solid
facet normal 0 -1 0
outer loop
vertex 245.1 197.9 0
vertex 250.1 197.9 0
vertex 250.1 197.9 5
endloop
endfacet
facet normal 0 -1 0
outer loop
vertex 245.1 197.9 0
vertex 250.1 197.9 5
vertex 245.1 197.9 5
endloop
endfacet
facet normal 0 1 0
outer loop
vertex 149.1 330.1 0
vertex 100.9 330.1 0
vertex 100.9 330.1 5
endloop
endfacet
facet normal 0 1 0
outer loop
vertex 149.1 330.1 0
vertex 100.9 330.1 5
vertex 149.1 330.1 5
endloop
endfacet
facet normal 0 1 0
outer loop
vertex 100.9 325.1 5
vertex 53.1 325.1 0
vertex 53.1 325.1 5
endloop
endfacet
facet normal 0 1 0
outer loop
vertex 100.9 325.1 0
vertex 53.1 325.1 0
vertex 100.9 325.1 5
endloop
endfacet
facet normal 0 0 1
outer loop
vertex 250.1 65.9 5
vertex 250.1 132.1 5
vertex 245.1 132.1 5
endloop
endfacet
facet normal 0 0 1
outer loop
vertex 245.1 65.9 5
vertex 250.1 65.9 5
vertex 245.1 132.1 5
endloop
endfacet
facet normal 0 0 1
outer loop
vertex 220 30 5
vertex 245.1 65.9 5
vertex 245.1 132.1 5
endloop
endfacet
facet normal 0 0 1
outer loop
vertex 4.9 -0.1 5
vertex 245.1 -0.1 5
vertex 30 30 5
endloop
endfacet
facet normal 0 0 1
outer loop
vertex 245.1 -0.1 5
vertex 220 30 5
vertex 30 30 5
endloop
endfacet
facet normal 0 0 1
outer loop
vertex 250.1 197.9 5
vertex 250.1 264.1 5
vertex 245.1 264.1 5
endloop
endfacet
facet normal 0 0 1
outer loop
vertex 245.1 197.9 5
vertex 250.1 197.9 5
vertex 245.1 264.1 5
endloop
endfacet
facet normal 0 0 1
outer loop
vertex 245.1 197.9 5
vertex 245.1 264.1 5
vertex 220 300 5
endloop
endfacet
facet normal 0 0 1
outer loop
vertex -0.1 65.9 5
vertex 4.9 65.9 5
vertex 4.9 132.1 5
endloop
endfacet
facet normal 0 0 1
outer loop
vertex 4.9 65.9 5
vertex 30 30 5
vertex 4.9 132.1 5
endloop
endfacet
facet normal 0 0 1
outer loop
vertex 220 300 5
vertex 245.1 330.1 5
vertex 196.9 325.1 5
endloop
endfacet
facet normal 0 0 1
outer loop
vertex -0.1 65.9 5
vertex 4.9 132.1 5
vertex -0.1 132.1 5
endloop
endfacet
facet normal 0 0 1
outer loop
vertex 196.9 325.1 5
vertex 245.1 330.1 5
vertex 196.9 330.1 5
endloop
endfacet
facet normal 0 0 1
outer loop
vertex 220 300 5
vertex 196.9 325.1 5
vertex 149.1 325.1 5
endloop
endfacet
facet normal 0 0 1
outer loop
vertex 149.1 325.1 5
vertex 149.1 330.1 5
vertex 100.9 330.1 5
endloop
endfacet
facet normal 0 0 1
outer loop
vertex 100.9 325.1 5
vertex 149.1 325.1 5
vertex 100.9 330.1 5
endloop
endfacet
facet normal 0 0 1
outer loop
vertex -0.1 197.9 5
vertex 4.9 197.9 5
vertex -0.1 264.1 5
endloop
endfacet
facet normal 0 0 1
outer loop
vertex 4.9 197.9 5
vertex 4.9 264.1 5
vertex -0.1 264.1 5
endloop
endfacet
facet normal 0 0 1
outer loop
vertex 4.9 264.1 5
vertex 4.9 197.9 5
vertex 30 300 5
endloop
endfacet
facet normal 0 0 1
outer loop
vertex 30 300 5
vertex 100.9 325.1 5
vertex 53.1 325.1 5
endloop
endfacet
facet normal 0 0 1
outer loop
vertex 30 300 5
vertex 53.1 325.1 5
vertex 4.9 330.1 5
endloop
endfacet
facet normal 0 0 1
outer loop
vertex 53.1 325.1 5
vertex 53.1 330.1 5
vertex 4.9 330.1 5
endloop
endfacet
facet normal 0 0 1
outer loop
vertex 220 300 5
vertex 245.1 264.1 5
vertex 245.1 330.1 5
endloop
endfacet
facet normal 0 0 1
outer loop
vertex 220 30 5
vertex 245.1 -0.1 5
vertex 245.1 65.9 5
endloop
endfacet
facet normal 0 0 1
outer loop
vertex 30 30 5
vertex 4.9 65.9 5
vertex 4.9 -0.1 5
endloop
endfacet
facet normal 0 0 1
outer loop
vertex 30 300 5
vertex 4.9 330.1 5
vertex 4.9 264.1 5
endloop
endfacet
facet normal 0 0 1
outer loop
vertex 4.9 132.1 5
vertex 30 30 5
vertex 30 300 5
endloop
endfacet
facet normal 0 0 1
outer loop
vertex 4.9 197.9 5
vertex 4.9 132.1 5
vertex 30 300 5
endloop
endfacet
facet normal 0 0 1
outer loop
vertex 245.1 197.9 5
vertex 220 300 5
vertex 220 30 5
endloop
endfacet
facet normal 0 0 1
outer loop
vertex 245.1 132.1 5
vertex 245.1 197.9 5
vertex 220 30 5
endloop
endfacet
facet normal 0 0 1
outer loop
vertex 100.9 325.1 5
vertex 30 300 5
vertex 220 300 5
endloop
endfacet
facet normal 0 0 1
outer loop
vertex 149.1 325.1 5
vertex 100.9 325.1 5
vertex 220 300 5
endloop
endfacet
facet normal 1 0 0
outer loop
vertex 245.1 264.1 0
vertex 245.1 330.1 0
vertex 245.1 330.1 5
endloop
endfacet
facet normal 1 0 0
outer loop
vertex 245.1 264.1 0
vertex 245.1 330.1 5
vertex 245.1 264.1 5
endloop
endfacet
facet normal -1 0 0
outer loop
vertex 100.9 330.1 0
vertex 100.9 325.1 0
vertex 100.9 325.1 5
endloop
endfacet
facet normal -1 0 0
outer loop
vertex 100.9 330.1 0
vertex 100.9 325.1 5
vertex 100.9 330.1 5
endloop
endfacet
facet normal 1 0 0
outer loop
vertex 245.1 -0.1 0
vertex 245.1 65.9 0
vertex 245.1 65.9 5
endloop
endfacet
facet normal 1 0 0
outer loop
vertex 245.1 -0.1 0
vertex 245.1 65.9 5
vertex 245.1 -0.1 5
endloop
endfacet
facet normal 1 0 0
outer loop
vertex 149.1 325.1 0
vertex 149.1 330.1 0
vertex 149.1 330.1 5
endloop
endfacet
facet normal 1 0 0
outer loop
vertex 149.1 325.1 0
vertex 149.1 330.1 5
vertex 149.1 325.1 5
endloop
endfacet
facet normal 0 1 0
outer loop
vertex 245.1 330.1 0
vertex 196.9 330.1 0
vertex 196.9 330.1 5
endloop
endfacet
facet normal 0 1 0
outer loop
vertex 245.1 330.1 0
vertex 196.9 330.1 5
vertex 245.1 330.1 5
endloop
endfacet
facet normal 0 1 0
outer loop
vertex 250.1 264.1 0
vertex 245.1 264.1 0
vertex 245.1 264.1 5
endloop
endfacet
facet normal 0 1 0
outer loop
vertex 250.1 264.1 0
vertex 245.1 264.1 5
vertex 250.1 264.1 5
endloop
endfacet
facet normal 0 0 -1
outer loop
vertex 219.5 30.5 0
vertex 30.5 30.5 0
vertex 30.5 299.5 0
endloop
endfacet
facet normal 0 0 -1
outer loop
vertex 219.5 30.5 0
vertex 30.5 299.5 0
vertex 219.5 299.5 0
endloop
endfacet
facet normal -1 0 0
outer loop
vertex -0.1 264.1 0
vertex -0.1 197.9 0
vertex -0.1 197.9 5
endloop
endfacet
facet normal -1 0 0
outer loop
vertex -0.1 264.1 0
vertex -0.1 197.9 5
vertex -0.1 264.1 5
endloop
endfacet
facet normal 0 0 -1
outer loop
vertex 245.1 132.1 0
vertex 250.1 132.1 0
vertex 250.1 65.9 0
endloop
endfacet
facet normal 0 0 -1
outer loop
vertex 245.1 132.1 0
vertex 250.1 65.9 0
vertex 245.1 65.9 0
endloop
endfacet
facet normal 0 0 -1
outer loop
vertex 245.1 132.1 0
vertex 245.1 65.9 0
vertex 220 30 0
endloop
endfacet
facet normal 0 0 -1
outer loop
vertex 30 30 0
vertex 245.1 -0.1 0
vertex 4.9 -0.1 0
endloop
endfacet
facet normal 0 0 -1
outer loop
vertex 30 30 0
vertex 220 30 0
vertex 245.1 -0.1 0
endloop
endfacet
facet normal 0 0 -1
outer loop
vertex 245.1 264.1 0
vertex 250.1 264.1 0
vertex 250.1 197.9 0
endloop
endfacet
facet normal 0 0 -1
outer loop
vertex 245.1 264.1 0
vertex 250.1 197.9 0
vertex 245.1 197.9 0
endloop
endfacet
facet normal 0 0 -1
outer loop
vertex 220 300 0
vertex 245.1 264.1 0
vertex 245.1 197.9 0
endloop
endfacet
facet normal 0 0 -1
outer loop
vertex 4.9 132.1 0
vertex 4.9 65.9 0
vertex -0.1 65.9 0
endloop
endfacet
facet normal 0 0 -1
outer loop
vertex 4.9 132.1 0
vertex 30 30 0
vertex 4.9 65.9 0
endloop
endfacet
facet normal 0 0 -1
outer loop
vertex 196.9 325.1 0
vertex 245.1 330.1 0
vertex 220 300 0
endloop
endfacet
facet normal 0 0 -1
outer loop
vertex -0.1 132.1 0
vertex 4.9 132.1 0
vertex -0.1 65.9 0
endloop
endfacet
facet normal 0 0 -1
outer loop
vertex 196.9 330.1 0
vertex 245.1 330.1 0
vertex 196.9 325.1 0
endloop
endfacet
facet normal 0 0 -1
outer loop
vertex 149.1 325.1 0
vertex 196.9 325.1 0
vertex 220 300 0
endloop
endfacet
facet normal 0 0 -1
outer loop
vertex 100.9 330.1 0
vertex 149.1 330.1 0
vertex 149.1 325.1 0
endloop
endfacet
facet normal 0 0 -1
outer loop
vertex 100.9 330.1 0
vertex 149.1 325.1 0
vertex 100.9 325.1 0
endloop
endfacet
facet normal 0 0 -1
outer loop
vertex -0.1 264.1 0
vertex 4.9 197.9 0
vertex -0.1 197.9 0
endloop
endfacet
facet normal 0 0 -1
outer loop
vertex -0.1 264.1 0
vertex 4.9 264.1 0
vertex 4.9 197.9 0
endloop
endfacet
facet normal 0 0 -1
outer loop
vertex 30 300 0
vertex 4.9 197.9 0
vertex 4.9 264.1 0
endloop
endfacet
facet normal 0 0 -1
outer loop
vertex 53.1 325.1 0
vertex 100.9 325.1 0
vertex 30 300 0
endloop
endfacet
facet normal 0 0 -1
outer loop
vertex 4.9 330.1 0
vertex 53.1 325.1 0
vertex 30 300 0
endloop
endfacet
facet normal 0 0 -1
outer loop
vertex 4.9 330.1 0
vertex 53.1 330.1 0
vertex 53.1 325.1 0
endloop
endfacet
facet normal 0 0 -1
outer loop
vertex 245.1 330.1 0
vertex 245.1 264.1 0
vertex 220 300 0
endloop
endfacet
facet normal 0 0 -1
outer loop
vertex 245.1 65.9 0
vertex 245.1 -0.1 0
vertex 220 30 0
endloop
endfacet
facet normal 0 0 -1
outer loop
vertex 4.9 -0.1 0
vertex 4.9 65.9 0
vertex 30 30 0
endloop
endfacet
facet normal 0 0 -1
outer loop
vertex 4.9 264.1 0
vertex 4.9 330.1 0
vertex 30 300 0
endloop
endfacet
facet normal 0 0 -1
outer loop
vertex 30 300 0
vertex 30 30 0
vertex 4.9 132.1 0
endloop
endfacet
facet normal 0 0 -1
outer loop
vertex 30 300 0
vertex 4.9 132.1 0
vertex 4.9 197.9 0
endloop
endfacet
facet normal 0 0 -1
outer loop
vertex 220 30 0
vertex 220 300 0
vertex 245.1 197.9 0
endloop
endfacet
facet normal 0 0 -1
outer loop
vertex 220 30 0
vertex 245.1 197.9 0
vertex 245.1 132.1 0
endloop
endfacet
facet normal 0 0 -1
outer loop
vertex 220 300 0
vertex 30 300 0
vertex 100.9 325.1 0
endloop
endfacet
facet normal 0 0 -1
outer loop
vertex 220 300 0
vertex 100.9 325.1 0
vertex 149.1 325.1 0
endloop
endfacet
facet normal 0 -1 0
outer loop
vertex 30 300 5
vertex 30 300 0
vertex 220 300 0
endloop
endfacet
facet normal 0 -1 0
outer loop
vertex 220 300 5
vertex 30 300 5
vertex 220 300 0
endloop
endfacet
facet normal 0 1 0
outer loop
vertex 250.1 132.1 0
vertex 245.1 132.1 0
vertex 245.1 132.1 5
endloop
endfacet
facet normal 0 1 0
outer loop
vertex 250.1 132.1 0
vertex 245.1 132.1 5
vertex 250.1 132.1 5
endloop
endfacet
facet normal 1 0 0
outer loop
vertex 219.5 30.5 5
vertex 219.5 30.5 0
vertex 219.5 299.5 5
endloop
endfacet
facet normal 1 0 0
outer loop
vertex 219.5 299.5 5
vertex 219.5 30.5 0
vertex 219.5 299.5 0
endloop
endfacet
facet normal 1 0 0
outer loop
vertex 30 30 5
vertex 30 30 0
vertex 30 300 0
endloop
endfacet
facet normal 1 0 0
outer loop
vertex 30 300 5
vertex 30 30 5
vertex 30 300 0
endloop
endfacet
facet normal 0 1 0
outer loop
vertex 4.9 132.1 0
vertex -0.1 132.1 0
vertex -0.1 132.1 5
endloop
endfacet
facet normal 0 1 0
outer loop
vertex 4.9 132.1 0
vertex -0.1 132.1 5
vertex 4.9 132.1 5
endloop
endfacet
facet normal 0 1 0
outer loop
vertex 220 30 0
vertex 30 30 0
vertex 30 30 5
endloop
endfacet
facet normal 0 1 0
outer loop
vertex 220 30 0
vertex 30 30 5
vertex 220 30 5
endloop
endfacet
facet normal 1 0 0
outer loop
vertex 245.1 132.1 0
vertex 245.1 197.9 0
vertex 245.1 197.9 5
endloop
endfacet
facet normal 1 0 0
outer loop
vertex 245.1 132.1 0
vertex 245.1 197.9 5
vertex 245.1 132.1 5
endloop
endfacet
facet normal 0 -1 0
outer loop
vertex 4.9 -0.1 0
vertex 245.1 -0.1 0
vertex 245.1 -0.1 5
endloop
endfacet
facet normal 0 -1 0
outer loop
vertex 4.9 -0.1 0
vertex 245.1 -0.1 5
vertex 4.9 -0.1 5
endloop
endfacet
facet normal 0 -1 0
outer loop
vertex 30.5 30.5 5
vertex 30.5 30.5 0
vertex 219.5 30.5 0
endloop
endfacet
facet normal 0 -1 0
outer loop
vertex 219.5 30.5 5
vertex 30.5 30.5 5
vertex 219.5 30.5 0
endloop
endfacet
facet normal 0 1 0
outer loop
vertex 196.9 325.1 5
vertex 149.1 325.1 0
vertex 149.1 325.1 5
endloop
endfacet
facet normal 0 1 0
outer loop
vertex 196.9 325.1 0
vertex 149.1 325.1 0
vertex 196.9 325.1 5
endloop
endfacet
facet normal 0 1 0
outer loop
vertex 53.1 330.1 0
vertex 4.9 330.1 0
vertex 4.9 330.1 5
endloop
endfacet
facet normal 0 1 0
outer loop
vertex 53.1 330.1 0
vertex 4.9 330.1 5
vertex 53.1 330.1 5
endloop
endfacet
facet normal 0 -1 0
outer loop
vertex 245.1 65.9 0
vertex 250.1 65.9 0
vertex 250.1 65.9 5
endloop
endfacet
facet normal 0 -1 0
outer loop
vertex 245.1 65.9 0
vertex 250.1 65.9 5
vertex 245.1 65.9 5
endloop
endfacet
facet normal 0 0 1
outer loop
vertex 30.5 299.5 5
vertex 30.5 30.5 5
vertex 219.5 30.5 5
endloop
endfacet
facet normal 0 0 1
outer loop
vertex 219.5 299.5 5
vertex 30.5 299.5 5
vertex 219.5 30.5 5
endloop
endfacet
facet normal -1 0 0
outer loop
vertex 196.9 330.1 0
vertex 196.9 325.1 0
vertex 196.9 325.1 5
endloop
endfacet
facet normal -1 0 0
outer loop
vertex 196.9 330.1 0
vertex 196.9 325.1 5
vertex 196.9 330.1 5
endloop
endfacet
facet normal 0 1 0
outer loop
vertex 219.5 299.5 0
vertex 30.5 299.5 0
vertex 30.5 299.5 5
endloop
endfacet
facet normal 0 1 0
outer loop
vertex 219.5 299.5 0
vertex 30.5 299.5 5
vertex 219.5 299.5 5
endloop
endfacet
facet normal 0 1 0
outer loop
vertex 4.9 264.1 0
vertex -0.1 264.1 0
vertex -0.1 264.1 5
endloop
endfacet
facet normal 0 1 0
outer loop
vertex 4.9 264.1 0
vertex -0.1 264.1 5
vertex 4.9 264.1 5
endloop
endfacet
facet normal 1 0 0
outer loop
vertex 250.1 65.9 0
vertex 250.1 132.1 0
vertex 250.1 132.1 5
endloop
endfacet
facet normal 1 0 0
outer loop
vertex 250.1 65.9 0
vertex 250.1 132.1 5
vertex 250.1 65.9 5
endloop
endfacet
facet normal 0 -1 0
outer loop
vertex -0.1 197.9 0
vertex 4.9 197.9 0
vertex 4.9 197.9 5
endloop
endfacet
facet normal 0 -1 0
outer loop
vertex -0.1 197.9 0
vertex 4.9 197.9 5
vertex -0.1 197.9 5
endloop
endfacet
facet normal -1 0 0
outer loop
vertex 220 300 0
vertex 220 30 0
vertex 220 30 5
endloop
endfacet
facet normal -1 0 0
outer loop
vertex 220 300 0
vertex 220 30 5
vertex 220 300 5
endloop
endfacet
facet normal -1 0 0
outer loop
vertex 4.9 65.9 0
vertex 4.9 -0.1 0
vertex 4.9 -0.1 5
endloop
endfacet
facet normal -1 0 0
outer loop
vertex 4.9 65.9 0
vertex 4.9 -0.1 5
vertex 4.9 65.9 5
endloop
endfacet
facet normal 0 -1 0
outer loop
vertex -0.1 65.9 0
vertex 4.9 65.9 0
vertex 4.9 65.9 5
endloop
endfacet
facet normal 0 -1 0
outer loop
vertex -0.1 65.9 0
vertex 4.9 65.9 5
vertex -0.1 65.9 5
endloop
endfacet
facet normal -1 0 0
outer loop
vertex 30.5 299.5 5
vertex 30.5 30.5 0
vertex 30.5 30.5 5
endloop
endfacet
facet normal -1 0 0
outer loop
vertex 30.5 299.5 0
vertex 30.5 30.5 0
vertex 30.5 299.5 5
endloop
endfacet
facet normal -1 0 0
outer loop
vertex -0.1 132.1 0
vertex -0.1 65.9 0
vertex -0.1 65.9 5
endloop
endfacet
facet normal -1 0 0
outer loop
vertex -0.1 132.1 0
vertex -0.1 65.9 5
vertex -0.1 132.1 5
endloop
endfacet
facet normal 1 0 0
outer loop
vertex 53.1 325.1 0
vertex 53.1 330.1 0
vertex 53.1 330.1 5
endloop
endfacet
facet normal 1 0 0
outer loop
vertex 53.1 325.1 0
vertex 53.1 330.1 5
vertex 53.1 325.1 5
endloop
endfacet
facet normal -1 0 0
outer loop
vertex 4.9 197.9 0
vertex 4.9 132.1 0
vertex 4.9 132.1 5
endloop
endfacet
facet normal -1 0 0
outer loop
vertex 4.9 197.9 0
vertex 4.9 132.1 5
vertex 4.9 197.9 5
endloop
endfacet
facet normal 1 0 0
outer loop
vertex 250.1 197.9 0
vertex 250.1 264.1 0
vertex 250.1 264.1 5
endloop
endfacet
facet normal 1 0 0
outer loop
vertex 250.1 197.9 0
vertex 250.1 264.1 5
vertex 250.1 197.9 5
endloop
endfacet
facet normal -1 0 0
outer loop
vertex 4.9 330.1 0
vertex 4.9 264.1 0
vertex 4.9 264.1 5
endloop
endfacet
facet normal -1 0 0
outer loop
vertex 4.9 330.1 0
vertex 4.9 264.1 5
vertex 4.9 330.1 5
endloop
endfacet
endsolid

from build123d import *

# Parameters (mm, degrees)
ESQUISSE1_W          = 189
ESQUISSE1_H          = 269
BOSS_EXTRU_1_DEPTH   = 5
ESQUISSE1_W_2        = 190
ESQUISSE1_H_2        = 270
BOSS_EXTRU_1_2_DEPTH = 5


with BuildPart() as part:
    # Esquisse1 → Boss.-Extru.1 (new body)
    with BuildSketch(Plane.XY):
        with Locations((125, 165)):
            Rectangle(ESQUISSE1_W, ESQUISSE1_H)
    extrude(amount=BOSS_EXTRU_1_DEPTH)


with BuildPart() as body_2:
    # Esquisse1 → Boss.-Extru.1 2 (new body)
    with BuildSketch(Plane.XY):
        Polygon((196.9, 325.1), (196.9, 330.1), (245.1, 330.1), (245.1, 264.1), (250.1, 264.1), (250.1, 197.9), (245.1, 197.9), (245.1, 132.1), (250.1, 132.1), (250.1, 65.9), (245.1, 65.9), (245.1, -0.1), (4.9, -0.1), (4.9, 65.9), (-0.1, 65.9), (-0.1, 132.1), (4.9, 132.1), (4.9, 197.9), (-0.1, 197.9), (-0.1, 264.1), (4.9, 264.1), (4.9, 330.1), (53.1, 330.1), (53.1, 325.1), (100.9, 325.1), (100.9, 330.1), (149.1, 330.1), (149.1, 325.1), align=None)
        with Locations((125, 165)):
            Rectangle(ESQUISSE1_W_2, ESQUISSE1_H_2, mode=Mode.SUBTRACT)
    extrude(amount=BOSS_EXTRU_1_2_DEPTH)


solid = Compound([part.part, body_2.part])
